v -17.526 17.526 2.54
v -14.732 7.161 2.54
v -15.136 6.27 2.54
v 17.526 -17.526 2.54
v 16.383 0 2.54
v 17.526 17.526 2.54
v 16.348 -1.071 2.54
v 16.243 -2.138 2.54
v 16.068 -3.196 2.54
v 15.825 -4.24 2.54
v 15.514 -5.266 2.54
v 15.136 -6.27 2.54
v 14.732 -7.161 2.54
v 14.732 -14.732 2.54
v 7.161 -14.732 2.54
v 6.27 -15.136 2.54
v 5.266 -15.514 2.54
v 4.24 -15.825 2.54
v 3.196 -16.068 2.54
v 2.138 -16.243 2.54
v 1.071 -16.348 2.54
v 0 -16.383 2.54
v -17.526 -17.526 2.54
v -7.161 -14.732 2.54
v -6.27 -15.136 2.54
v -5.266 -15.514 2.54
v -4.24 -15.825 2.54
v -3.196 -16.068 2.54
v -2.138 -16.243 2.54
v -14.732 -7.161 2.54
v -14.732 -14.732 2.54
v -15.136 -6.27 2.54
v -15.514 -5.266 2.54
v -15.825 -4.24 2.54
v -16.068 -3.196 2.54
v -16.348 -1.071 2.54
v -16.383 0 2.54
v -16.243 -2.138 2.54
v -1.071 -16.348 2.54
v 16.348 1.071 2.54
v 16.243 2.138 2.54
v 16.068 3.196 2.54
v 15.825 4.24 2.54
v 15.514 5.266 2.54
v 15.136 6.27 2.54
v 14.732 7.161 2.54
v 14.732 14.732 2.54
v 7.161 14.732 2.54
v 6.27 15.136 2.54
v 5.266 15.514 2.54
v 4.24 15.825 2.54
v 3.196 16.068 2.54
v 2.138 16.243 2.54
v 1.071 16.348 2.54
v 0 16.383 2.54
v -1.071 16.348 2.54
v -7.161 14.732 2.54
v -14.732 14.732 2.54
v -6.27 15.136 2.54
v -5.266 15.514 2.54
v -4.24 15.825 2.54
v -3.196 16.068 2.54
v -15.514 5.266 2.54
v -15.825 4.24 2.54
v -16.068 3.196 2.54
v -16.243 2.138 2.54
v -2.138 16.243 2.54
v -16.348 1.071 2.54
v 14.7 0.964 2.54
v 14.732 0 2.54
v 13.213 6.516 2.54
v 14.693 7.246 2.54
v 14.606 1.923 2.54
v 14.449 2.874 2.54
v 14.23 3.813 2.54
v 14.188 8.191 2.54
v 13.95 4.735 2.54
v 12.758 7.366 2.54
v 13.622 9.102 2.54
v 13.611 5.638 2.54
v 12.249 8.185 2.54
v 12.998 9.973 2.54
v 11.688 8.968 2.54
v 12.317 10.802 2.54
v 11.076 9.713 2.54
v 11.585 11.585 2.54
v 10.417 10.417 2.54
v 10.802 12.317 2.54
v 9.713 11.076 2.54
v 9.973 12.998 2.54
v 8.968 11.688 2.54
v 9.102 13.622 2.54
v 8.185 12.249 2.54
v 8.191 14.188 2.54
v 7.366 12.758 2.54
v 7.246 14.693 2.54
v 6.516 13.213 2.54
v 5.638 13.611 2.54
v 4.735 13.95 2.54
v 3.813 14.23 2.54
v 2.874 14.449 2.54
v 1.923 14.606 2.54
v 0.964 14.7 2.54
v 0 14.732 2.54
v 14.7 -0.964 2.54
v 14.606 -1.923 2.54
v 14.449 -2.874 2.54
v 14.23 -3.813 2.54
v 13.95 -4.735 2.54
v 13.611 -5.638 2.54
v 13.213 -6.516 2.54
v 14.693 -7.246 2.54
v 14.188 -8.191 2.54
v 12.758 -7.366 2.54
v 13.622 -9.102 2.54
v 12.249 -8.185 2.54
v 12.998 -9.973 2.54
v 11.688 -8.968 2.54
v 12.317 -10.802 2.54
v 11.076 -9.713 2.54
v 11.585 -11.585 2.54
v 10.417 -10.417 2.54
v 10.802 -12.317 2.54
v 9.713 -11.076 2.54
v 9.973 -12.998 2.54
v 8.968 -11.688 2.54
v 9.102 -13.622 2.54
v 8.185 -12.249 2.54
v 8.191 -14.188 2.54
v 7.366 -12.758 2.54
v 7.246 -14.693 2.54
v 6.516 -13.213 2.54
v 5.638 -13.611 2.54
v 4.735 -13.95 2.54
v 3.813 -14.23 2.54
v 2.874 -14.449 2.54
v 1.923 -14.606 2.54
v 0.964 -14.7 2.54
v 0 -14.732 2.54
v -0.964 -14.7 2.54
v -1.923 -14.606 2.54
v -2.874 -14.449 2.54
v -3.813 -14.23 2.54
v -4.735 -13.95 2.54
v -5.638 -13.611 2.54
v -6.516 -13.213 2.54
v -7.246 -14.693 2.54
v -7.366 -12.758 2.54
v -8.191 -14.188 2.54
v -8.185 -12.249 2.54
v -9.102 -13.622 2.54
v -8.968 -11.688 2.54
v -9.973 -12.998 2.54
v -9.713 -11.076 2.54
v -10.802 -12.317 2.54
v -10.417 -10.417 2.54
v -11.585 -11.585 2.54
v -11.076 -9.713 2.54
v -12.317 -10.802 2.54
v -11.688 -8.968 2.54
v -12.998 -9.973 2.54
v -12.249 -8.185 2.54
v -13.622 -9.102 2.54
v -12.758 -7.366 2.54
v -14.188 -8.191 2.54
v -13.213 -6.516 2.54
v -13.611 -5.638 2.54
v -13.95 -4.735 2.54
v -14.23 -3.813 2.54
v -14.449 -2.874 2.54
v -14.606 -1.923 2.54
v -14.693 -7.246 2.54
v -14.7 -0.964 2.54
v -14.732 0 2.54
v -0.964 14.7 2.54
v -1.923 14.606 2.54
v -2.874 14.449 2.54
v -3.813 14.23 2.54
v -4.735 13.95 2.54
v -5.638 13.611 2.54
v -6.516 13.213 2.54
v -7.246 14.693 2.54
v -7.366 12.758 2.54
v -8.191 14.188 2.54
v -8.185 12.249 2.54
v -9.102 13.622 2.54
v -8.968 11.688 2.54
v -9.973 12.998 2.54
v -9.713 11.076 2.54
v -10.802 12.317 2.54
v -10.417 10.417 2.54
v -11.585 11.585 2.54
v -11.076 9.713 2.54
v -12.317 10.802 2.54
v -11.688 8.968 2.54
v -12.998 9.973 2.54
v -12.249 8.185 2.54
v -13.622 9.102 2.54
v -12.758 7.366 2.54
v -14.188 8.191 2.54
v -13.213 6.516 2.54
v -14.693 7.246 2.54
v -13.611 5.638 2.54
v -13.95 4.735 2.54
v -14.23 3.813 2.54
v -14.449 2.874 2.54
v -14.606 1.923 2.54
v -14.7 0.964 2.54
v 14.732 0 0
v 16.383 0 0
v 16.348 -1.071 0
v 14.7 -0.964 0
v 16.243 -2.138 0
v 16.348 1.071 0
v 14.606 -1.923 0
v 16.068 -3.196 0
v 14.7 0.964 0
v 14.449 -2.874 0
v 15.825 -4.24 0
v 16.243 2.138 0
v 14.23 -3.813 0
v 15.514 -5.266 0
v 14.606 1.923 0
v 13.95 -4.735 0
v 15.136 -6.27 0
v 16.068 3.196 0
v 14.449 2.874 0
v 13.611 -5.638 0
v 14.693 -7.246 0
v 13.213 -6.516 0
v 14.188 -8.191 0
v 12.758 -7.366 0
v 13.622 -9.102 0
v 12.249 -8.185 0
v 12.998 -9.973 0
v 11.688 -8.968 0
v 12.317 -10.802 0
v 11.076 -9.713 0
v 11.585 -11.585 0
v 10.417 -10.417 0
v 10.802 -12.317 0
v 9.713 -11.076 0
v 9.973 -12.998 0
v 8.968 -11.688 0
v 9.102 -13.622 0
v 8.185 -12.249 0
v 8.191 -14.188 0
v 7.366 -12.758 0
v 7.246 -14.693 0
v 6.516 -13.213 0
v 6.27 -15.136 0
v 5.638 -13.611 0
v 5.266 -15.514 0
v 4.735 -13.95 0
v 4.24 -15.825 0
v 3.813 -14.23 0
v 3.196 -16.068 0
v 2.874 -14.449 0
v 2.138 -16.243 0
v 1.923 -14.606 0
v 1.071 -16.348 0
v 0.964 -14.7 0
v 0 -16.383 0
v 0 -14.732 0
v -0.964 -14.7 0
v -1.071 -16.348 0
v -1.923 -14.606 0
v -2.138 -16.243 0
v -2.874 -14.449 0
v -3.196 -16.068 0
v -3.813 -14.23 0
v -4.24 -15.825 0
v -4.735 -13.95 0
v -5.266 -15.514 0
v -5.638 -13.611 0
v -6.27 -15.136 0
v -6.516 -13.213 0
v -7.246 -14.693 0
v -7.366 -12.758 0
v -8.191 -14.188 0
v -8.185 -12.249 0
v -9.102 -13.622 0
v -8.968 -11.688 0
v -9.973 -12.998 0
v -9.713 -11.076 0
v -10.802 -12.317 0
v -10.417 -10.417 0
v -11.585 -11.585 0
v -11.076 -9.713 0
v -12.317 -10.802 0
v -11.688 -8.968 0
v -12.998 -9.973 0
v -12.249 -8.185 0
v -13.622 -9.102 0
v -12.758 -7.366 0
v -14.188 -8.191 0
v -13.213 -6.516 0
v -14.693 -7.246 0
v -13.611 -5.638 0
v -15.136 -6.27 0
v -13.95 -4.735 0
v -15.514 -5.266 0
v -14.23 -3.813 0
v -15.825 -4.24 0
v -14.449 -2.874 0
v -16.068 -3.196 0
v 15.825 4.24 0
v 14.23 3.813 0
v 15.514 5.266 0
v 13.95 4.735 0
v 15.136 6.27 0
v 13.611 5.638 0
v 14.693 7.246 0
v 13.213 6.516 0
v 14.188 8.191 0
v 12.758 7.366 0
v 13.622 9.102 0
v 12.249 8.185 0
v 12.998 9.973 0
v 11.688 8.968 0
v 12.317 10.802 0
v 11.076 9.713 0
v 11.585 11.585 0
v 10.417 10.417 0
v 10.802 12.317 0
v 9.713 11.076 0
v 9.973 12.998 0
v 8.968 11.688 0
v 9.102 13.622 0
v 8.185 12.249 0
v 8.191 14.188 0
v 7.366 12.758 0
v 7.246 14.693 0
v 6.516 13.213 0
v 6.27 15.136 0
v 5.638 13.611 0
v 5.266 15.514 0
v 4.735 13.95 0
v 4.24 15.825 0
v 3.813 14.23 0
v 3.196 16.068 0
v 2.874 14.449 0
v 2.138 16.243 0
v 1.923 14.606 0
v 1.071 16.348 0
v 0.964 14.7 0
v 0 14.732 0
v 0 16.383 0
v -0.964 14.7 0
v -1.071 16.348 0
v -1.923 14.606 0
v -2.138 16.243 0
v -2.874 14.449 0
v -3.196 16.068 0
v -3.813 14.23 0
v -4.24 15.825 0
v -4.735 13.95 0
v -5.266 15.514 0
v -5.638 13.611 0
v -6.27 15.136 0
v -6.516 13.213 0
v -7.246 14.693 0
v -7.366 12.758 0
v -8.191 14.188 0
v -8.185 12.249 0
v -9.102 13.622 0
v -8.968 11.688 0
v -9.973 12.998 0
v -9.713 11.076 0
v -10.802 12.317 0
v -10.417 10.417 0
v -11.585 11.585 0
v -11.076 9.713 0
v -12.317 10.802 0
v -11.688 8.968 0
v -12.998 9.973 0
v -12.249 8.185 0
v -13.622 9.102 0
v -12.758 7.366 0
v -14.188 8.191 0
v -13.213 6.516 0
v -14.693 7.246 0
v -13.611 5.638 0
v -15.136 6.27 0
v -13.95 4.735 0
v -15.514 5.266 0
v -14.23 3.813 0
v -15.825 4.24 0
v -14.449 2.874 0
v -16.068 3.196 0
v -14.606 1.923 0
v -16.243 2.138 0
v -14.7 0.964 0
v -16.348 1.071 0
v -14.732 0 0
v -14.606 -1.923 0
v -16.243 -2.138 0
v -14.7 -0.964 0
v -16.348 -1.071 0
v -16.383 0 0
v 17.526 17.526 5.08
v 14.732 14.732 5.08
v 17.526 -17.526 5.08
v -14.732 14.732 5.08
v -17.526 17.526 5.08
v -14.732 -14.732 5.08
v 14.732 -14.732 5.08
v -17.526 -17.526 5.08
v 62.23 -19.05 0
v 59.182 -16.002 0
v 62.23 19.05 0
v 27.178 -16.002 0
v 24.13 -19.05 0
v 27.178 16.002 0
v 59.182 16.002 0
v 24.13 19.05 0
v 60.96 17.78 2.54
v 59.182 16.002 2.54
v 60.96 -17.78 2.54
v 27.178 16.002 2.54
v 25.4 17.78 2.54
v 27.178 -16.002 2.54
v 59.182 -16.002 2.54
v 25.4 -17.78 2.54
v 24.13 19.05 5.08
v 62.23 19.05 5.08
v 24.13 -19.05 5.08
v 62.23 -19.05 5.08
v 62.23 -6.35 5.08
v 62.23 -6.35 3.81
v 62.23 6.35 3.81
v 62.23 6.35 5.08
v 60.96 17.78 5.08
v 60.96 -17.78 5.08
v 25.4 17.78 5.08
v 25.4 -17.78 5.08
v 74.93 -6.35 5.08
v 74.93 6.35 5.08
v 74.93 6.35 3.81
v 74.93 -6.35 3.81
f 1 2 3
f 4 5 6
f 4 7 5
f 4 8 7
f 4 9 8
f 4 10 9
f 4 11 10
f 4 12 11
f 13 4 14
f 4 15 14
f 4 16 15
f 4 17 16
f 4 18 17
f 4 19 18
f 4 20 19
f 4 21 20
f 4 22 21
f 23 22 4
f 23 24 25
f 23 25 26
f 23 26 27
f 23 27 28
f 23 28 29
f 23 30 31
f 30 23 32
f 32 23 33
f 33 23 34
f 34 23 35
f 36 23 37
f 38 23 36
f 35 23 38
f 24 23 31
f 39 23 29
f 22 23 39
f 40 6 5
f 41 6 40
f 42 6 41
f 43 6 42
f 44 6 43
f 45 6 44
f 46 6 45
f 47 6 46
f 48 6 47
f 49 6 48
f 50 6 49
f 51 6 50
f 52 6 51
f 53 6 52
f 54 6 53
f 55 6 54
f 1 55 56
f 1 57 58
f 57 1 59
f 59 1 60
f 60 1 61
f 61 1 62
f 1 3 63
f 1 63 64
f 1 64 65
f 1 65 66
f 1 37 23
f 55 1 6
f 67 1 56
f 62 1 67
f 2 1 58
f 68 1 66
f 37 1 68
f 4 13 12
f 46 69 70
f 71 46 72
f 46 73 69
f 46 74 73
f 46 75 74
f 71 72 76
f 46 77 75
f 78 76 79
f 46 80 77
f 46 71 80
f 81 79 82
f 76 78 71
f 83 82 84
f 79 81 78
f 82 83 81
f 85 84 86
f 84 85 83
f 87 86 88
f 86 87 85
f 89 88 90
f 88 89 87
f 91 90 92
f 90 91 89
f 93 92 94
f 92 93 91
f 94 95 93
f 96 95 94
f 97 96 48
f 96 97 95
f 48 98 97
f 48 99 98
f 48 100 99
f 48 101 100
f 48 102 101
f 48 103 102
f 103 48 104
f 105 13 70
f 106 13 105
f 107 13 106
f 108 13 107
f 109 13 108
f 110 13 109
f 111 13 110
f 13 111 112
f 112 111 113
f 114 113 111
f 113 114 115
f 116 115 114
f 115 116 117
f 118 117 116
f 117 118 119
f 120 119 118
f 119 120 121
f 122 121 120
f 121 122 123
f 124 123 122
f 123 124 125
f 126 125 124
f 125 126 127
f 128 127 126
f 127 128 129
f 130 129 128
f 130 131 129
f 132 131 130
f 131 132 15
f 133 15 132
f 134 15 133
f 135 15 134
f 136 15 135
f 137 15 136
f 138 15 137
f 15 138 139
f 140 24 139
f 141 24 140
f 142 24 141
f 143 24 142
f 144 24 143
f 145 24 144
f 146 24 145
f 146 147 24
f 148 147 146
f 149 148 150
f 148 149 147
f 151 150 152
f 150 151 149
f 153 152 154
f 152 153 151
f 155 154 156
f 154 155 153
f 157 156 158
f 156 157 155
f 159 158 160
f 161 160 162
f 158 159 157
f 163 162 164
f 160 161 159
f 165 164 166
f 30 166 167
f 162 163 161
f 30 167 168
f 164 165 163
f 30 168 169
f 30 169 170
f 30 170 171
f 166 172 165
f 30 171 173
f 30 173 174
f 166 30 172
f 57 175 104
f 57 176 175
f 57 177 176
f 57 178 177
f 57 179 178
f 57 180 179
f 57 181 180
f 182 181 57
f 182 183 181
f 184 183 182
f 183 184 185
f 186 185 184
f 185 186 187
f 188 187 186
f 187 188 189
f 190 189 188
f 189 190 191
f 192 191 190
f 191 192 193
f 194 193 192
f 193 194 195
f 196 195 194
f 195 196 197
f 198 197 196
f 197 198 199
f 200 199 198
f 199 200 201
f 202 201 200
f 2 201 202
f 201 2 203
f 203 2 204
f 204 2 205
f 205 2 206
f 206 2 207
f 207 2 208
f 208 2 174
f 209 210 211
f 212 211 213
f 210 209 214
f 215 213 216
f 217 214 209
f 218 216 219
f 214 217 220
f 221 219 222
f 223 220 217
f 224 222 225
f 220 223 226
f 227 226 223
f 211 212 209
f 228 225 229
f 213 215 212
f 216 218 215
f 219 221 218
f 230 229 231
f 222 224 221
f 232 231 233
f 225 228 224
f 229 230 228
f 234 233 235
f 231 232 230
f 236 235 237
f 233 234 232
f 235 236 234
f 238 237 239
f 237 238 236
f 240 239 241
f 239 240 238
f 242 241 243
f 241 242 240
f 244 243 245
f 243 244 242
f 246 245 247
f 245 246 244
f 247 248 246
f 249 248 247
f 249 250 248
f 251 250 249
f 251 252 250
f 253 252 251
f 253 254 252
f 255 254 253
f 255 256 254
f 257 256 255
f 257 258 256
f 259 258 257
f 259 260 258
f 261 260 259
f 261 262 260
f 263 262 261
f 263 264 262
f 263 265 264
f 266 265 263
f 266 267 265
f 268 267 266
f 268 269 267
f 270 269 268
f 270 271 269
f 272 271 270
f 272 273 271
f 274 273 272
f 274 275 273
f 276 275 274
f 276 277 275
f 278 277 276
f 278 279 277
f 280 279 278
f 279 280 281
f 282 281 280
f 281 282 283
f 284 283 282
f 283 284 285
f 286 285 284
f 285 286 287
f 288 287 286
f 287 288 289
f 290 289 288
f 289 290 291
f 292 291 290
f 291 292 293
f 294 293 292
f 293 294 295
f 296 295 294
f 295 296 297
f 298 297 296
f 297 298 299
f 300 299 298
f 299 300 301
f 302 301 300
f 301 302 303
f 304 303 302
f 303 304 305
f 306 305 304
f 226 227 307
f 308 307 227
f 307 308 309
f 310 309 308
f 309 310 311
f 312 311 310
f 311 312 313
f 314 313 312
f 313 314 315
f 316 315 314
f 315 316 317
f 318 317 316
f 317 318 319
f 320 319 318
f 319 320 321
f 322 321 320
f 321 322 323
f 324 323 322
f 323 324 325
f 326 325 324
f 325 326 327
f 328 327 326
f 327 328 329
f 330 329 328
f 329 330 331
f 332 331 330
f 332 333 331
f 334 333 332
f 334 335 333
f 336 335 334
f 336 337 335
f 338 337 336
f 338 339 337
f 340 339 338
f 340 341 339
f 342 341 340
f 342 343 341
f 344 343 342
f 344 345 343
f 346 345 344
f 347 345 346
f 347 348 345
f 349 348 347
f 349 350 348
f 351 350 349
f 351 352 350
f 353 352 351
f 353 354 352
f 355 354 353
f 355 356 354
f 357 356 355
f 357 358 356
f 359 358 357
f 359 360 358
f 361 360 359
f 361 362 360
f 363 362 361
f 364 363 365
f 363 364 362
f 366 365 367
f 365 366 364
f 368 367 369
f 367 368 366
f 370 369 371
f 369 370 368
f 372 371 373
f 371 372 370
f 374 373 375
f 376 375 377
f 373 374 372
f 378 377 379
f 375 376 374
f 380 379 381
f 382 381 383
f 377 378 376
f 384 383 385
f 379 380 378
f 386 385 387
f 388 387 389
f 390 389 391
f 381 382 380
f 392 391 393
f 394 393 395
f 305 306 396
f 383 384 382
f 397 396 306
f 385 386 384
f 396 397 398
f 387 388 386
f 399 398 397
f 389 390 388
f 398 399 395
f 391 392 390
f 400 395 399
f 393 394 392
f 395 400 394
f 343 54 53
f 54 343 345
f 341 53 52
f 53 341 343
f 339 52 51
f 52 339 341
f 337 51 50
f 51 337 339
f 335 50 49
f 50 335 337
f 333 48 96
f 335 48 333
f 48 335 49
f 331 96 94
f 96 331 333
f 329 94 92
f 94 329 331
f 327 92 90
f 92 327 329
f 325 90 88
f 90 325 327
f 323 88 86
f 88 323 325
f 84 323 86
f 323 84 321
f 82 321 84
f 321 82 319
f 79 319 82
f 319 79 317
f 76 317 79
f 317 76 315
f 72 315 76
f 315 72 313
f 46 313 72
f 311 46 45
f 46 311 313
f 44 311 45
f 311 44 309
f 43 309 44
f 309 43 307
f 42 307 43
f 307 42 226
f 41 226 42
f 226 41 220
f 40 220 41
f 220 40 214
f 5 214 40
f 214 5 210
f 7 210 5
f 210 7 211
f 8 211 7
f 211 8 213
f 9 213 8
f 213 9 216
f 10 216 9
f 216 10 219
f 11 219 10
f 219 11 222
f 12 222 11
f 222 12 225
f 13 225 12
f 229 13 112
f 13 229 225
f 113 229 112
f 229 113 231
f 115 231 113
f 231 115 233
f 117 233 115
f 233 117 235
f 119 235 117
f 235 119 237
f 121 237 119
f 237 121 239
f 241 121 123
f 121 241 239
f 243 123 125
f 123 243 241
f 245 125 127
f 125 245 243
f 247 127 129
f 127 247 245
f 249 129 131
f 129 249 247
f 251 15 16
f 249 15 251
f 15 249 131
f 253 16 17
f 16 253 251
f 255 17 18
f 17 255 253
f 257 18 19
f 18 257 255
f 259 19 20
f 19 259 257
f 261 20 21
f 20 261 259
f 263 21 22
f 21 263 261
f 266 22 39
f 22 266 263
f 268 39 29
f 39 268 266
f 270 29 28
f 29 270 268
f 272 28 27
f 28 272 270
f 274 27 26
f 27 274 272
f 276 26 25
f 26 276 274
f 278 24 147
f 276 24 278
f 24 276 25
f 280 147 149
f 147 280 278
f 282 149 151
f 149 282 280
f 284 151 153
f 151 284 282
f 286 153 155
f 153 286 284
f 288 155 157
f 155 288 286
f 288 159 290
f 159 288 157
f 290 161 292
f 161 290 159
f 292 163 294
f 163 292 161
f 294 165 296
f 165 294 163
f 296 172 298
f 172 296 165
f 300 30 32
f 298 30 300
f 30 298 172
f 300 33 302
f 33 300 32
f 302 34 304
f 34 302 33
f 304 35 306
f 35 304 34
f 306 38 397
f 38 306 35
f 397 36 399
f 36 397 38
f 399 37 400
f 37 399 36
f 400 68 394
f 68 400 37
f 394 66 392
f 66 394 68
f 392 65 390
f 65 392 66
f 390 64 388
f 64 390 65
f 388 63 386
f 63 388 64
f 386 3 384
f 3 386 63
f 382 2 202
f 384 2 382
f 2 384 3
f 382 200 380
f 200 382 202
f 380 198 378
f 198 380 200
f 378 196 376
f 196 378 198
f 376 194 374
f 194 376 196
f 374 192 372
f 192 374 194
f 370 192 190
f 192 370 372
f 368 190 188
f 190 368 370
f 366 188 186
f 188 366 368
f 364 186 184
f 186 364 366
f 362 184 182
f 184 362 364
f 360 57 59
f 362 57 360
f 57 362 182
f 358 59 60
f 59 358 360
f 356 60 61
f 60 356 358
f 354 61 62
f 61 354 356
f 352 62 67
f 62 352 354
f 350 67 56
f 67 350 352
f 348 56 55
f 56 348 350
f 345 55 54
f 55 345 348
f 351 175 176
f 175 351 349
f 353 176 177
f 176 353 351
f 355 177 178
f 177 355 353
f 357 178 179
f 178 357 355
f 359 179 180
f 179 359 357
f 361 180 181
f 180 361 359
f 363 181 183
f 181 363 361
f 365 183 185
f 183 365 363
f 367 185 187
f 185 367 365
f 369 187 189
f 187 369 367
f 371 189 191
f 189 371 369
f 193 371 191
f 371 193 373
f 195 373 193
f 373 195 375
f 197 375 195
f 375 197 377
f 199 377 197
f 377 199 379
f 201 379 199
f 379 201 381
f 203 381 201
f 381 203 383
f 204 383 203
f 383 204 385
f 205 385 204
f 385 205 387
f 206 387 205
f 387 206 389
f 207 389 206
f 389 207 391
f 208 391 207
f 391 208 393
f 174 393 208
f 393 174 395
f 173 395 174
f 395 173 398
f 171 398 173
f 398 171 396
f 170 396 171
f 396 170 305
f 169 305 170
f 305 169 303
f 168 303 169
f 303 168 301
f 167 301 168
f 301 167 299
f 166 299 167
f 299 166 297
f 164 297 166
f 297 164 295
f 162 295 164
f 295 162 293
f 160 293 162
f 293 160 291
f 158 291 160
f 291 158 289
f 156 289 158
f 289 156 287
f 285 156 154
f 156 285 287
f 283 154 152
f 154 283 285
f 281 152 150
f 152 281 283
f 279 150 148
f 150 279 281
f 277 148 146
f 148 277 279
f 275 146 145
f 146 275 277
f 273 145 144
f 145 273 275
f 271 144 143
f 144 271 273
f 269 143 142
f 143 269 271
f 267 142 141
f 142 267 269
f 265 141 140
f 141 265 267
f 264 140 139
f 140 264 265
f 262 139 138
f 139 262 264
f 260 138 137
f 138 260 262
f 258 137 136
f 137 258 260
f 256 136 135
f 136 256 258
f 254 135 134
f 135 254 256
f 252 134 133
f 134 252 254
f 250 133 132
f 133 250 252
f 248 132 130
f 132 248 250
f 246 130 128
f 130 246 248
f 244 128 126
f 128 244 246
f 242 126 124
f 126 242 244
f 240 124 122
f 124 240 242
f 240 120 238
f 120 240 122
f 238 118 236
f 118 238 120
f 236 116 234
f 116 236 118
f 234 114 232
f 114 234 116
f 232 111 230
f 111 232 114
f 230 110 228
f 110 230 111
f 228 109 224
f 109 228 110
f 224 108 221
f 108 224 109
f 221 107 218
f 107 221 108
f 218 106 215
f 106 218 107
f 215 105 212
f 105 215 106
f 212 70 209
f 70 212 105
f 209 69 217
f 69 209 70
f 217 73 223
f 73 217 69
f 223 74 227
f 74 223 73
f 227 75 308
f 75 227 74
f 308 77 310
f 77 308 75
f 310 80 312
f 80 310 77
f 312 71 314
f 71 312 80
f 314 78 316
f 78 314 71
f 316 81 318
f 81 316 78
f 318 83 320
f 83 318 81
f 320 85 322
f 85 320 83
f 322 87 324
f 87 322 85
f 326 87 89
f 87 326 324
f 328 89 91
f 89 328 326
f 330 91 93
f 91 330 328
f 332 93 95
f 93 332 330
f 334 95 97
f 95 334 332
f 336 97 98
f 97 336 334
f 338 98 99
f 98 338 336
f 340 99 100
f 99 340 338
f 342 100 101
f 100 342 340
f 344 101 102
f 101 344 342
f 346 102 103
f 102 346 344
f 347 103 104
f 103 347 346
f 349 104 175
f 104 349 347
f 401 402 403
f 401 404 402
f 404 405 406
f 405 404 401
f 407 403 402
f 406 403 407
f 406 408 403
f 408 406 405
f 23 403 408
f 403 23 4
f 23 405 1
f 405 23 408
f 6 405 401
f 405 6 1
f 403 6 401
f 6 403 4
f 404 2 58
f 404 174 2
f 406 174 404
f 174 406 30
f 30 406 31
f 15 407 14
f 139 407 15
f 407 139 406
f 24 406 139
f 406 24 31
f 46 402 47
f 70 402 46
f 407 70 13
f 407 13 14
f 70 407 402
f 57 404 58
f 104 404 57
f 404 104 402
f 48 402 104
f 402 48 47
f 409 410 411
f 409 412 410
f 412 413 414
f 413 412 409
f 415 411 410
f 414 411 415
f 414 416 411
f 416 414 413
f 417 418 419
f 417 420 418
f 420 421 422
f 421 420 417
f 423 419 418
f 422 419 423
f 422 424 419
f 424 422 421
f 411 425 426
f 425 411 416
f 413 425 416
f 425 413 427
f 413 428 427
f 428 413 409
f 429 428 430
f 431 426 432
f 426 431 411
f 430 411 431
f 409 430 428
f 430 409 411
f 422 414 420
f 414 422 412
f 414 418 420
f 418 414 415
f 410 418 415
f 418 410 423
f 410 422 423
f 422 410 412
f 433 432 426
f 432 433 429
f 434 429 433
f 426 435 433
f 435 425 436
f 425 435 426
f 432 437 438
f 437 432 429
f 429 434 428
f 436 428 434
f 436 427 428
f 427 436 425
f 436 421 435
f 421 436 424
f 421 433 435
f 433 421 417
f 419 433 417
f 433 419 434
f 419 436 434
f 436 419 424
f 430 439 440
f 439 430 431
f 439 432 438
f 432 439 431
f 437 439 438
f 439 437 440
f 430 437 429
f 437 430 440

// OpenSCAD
ViewScale = [0.0254, 0.0254, 0.0254];


module cmount()
{
    linear_extrude(100)
    difference() {
        circle(1290/2, $fn=96);
        circle(1160/2, $fn=96);
    }
}

module smount()
{
    linear_extrude(100)
    difference() {
        square([1380, 1380], center=true);
        square([1160, 1160], center=true);
    }
}

module slid()
{
    linear_extrude(100)
    difference() {
        square([1500, 1500], center=true);
        square([1260, 1260], center=true);
    }
    translate([0, 0, 100])
    linear_extrude(100)
    difference() {
        square([1500, 1500], center=true);
        square([1400, 1400], center=true);
    }
    // tab
    translate([1000, 0, 150])
    linear_extrude(50)
    square([500, 500], center=true);

}

scale(ViewScale)
{
    translate([0, 0, 100])
    rotate([180, 0, 0]) {
    cmount();
    translate([0, 0, -100])
    smount();
    }

    translate([1700, 0, 0])
    slid();
}
